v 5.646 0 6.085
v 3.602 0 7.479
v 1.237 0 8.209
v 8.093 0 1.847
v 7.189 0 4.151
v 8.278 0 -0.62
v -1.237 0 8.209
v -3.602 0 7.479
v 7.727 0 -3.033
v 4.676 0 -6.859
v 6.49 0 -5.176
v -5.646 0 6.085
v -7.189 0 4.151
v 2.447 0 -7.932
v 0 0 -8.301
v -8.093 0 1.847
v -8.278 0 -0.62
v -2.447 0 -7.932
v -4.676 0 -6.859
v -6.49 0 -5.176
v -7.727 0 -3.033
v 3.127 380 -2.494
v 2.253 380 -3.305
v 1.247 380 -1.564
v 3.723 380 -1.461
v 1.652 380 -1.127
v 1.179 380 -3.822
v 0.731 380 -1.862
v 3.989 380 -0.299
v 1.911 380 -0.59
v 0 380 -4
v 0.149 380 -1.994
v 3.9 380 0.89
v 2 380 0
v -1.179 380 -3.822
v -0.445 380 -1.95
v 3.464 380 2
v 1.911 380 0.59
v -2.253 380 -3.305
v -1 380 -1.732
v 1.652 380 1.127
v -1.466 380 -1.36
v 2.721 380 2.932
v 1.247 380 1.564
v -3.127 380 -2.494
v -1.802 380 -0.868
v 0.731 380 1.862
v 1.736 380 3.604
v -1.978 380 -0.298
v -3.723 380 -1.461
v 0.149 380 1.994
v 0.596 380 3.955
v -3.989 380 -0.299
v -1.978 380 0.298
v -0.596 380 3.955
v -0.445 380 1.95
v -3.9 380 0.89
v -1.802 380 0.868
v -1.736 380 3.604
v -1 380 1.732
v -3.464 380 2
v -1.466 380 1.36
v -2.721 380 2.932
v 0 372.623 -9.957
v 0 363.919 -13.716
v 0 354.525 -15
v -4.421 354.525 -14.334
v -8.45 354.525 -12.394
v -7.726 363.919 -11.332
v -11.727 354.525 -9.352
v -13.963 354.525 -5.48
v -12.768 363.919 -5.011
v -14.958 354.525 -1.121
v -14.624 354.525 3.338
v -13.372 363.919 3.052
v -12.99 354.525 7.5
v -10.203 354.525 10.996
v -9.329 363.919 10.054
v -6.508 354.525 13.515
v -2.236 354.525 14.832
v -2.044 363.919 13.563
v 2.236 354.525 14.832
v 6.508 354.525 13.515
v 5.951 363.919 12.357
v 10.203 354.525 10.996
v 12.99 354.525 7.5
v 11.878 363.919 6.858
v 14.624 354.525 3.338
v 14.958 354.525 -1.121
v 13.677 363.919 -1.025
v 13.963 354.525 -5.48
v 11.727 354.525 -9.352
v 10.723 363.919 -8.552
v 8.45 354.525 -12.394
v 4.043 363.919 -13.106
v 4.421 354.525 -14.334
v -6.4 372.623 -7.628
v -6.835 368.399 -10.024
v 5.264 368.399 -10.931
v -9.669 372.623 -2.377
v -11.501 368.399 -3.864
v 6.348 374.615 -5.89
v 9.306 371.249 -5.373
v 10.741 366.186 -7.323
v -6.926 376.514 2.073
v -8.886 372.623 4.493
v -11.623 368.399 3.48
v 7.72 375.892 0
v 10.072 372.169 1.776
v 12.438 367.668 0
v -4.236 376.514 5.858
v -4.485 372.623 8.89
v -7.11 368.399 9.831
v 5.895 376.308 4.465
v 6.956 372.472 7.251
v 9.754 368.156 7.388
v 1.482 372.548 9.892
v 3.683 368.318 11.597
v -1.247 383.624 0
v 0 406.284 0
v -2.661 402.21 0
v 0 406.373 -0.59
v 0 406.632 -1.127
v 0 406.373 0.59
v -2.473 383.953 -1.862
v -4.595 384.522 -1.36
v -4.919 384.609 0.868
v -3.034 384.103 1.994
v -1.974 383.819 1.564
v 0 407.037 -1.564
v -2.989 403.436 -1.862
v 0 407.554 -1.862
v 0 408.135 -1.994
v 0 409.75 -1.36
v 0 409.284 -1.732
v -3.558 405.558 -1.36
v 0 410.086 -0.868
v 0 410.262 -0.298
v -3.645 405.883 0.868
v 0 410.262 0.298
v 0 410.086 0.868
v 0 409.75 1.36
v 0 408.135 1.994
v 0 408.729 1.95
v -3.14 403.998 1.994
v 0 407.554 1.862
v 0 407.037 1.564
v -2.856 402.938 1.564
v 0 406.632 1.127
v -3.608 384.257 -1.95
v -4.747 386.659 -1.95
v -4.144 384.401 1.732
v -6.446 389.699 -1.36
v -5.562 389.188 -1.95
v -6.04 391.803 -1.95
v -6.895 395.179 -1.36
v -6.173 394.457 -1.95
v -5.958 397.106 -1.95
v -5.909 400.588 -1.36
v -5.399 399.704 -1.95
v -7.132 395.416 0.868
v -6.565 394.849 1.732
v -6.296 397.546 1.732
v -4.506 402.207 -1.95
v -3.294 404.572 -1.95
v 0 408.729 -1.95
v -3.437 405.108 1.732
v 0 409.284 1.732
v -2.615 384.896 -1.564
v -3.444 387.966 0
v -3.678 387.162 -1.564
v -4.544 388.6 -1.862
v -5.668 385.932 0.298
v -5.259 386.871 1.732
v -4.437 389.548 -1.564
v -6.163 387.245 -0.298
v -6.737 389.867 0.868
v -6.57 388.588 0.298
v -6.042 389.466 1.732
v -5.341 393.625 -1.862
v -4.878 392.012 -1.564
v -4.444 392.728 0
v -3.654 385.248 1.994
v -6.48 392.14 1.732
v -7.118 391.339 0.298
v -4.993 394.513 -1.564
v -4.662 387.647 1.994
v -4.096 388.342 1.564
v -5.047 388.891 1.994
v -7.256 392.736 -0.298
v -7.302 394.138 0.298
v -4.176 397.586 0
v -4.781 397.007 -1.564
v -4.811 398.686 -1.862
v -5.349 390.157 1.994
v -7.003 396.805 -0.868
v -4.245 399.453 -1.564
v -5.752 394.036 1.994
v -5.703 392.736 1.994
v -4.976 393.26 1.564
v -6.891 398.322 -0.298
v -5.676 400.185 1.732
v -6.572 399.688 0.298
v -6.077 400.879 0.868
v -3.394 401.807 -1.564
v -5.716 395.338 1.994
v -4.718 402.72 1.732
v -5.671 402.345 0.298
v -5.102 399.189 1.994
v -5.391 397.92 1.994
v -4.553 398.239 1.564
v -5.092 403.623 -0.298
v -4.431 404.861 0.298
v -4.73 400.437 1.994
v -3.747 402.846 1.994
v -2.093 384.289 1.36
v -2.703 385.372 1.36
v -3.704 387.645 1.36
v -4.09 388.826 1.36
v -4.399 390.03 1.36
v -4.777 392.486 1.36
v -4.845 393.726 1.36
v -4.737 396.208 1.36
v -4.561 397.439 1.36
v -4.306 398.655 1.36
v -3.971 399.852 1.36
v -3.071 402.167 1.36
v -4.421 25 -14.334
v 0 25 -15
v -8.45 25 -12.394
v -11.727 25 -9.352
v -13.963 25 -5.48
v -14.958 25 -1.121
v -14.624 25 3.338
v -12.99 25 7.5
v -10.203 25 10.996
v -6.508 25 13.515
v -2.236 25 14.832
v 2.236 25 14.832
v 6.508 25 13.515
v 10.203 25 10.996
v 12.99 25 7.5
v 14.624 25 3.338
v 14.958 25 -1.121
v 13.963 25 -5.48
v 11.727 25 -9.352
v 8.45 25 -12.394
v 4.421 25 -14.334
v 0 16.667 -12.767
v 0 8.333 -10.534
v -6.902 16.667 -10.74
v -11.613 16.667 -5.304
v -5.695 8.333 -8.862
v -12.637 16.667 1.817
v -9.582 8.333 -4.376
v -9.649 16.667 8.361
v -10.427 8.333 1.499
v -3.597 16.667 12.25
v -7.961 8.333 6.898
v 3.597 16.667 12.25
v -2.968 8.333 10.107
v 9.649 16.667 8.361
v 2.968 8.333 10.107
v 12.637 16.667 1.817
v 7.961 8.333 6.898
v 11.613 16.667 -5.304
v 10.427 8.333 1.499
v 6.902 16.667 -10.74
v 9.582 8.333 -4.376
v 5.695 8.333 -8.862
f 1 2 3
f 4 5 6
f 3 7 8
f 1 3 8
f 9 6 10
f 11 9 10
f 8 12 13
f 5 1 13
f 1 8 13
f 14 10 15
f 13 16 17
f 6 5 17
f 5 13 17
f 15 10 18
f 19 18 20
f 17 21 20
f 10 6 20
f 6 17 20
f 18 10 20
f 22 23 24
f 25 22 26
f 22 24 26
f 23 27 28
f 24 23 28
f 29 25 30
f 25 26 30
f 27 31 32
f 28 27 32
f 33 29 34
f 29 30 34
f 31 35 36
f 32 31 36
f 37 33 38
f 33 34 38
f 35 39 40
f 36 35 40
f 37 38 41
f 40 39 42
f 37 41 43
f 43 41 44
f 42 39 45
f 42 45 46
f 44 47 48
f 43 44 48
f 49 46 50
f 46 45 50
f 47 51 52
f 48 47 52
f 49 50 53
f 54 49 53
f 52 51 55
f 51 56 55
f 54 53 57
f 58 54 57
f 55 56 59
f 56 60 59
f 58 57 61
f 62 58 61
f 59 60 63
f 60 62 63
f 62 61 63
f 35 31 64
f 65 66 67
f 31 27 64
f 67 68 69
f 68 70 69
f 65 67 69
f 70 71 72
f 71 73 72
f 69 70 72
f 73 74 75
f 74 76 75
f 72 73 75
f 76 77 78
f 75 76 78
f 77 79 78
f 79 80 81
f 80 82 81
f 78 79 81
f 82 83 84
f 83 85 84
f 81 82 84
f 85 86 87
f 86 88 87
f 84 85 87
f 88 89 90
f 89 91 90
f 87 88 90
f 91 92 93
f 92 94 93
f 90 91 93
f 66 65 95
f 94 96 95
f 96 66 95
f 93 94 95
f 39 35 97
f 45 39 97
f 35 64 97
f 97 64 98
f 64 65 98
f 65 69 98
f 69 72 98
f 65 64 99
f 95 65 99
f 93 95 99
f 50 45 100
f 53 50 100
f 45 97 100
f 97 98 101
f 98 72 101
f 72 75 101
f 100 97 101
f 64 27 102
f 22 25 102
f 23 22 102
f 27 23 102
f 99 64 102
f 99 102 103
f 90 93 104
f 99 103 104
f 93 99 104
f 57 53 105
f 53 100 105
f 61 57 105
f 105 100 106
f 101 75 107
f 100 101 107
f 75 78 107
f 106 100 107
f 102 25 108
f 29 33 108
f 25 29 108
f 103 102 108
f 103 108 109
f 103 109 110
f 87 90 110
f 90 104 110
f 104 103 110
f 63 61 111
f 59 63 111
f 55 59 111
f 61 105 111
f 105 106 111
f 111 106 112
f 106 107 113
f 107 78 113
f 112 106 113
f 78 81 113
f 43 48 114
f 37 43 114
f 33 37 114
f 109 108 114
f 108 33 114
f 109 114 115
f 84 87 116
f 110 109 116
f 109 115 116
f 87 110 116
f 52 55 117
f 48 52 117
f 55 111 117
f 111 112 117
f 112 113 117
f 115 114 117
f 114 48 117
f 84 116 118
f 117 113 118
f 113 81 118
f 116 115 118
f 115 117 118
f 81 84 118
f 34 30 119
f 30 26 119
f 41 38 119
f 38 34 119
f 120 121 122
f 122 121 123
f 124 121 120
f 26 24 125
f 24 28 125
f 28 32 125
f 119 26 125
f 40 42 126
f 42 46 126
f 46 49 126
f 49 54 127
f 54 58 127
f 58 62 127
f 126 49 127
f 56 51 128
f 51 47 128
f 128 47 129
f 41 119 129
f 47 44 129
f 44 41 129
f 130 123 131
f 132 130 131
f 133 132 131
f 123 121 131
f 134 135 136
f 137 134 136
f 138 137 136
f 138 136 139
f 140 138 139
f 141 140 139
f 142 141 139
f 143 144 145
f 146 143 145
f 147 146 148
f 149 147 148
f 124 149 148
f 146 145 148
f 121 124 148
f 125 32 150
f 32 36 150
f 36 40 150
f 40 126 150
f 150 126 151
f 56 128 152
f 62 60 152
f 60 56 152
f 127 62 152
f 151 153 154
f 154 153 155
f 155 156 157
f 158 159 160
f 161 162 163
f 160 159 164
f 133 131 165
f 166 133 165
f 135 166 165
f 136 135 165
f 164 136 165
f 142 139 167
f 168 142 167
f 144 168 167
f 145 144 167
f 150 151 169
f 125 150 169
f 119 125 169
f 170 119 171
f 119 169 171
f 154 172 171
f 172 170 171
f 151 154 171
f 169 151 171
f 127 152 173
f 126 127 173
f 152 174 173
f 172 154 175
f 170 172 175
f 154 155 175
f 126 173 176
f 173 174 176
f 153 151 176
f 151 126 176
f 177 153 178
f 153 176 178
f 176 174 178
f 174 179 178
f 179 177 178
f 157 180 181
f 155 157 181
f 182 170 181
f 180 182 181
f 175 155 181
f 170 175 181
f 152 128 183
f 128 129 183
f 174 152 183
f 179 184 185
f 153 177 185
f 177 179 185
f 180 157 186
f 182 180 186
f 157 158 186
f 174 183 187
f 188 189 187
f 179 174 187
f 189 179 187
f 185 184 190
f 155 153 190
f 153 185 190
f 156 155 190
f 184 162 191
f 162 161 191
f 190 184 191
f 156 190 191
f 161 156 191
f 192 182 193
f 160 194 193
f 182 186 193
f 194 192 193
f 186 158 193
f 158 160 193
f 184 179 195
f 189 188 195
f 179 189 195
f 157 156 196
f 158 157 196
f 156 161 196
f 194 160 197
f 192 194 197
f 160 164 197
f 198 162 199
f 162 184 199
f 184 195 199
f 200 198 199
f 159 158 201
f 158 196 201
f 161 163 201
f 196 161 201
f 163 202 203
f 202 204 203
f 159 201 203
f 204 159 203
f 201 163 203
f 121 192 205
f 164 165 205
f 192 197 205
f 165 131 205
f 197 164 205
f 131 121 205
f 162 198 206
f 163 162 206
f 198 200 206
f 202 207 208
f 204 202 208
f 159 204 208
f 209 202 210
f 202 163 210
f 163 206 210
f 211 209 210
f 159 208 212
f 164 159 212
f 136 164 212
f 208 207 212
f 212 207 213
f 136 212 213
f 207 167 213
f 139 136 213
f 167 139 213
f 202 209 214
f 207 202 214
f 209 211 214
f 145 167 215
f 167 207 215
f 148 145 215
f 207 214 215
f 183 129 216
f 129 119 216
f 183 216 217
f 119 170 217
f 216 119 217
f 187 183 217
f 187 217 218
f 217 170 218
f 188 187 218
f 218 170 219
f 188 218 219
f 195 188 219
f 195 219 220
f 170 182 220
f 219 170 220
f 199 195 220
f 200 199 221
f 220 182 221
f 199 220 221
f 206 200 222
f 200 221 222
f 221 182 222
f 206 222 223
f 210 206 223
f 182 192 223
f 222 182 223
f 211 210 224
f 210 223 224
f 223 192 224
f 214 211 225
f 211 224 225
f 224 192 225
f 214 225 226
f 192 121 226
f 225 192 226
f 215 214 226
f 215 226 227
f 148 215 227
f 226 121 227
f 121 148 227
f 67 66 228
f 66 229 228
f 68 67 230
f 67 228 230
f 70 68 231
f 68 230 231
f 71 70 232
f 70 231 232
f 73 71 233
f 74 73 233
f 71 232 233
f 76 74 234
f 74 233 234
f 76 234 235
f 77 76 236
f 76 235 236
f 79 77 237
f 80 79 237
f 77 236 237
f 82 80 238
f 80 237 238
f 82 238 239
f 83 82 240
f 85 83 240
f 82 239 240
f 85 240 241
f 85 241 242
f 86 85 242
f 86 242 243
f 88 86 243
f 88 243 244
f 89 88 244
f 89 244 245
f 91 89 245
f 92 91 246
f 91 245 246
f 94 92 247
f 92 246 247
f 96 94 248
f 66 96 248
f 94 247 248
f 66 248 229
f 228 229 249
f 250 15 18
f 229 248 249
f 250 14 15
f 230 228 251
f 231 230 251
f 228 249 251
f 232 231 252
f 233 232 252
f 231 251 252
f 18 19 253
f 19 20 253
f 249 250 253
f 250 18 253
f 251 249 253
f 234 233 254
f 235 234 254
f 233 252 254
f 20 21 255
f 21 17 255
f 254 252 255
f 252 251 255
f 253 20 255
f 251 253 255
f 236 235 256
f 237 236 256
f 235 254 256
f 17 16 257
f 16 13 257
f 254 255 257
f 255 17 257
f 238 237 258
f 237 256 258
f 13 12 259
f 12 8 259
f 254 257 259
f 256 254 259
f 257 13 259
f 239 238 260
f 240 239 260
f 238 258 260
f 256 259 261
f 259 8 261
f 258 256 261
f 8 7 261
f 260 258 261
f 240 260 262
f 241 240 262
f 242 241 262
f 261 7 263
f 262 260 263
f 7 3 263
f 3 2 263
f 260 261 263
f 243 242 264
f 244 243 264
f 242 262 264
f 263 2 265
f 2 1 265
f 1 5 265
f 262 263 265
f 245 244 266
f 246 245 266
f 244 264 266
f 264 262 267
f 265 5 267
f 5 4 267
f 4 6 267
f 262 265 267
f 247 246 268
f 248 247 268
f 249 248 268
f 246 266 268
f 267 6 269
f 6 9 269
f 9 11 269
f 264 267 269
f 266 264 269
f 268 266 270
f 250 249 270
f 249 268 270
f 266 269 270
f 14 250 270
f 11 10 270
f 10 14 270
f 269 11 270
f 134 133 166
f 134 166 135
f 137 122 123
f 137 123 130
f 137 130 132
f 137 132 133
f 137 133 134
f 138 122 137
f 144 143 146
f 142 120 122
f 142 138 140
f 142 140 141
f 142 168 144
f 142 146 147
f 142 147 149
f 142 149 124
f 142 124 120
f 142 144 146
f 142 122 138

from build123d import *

# Parameters (mm, degrees)
SKETCH7_R = 2


with BuildPart() as part:
    # Sketch1 → Revolve1 (revolve)
    with BuildSketch(Plane.XY, mode=Mode.PRIVATE) as revolve1_sk:
        with BuildLine():
            Line((0, 0), (0, 380))
            Line((0, 380), (4, 380))
            ThreePointArc((4, 380), (12.132538026, 368.39895852), (15, 354.524521594))
            Line((15, 354.524521594), (15, 25))
            Line((15, 25), (8.301270189, 0))
            Line((8.301270189, 0), (0, 0))
        make_face()
    revolve(revolve1_sk.sketch.rotate(Axis((0, 0, 0), (0, 1, 0)), 90), axis=Axis((0, 0, 0), (0, 1, 0)))

    # Sweep6: sweep along a path in Sketch11
    with BuildLine(Plane.XY) as sweep6_path:
        ThreePointArc((0, 380), (-5.857864376, 394.142135624), (0, 408.284271247))
    # Sketch7 → Sweep6 (sweep)
    with BuildSketch(Plane(origin=(0, 380, 0), x_dir=(1, 0, 0), z_dir=(0, 1, 0))):
        Circle(SKETCH7_R)
    sweep(path=sweep6_path.line)


solid = part.part
